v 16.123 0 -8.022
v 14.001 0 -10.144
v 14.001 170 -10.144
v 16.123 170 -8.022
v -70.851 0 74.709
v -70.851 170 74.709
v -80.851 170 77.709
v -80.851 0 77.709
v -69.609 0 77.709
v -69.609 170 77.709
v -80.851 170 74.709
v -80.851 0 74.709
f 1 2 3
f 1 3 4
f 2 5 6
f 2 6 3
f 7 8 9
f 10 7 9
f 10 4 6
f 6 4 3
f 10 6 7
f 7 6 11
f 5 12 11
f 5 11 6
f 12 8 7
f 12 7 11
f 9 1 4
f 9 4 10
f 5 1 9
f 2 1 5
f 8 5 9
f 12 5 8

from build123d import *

# Parameters (mm, degrees)
SKETCH_1_W      = 10
SKETCH_1_H      = 3
EXTRUDE_1_DEPTH = 170


with BuildPart() as part:
    # 草图1 → 凸台-拉伸1 (new body)
    with BuildSketch(Plane(origin=(0, 0, 0), x_dir=(1, 0, 0), z_dir=(0, 1, 0))):
        Polygon((-69.608677765, -77.709177727), (-70.851318452, -77.709177727), (-70.851318452, -74.709177727), (14.001495291, 10.143636016), (16.122815634, 8.022315672), align=None)
        with Locations((-75.851318452, -76.209177727)):
            Rectangle(SKETCH_1_W, SKETCH_1_H)
    extrude(amount=EXTRUDE_1_DEPTH)


solid = part.part
